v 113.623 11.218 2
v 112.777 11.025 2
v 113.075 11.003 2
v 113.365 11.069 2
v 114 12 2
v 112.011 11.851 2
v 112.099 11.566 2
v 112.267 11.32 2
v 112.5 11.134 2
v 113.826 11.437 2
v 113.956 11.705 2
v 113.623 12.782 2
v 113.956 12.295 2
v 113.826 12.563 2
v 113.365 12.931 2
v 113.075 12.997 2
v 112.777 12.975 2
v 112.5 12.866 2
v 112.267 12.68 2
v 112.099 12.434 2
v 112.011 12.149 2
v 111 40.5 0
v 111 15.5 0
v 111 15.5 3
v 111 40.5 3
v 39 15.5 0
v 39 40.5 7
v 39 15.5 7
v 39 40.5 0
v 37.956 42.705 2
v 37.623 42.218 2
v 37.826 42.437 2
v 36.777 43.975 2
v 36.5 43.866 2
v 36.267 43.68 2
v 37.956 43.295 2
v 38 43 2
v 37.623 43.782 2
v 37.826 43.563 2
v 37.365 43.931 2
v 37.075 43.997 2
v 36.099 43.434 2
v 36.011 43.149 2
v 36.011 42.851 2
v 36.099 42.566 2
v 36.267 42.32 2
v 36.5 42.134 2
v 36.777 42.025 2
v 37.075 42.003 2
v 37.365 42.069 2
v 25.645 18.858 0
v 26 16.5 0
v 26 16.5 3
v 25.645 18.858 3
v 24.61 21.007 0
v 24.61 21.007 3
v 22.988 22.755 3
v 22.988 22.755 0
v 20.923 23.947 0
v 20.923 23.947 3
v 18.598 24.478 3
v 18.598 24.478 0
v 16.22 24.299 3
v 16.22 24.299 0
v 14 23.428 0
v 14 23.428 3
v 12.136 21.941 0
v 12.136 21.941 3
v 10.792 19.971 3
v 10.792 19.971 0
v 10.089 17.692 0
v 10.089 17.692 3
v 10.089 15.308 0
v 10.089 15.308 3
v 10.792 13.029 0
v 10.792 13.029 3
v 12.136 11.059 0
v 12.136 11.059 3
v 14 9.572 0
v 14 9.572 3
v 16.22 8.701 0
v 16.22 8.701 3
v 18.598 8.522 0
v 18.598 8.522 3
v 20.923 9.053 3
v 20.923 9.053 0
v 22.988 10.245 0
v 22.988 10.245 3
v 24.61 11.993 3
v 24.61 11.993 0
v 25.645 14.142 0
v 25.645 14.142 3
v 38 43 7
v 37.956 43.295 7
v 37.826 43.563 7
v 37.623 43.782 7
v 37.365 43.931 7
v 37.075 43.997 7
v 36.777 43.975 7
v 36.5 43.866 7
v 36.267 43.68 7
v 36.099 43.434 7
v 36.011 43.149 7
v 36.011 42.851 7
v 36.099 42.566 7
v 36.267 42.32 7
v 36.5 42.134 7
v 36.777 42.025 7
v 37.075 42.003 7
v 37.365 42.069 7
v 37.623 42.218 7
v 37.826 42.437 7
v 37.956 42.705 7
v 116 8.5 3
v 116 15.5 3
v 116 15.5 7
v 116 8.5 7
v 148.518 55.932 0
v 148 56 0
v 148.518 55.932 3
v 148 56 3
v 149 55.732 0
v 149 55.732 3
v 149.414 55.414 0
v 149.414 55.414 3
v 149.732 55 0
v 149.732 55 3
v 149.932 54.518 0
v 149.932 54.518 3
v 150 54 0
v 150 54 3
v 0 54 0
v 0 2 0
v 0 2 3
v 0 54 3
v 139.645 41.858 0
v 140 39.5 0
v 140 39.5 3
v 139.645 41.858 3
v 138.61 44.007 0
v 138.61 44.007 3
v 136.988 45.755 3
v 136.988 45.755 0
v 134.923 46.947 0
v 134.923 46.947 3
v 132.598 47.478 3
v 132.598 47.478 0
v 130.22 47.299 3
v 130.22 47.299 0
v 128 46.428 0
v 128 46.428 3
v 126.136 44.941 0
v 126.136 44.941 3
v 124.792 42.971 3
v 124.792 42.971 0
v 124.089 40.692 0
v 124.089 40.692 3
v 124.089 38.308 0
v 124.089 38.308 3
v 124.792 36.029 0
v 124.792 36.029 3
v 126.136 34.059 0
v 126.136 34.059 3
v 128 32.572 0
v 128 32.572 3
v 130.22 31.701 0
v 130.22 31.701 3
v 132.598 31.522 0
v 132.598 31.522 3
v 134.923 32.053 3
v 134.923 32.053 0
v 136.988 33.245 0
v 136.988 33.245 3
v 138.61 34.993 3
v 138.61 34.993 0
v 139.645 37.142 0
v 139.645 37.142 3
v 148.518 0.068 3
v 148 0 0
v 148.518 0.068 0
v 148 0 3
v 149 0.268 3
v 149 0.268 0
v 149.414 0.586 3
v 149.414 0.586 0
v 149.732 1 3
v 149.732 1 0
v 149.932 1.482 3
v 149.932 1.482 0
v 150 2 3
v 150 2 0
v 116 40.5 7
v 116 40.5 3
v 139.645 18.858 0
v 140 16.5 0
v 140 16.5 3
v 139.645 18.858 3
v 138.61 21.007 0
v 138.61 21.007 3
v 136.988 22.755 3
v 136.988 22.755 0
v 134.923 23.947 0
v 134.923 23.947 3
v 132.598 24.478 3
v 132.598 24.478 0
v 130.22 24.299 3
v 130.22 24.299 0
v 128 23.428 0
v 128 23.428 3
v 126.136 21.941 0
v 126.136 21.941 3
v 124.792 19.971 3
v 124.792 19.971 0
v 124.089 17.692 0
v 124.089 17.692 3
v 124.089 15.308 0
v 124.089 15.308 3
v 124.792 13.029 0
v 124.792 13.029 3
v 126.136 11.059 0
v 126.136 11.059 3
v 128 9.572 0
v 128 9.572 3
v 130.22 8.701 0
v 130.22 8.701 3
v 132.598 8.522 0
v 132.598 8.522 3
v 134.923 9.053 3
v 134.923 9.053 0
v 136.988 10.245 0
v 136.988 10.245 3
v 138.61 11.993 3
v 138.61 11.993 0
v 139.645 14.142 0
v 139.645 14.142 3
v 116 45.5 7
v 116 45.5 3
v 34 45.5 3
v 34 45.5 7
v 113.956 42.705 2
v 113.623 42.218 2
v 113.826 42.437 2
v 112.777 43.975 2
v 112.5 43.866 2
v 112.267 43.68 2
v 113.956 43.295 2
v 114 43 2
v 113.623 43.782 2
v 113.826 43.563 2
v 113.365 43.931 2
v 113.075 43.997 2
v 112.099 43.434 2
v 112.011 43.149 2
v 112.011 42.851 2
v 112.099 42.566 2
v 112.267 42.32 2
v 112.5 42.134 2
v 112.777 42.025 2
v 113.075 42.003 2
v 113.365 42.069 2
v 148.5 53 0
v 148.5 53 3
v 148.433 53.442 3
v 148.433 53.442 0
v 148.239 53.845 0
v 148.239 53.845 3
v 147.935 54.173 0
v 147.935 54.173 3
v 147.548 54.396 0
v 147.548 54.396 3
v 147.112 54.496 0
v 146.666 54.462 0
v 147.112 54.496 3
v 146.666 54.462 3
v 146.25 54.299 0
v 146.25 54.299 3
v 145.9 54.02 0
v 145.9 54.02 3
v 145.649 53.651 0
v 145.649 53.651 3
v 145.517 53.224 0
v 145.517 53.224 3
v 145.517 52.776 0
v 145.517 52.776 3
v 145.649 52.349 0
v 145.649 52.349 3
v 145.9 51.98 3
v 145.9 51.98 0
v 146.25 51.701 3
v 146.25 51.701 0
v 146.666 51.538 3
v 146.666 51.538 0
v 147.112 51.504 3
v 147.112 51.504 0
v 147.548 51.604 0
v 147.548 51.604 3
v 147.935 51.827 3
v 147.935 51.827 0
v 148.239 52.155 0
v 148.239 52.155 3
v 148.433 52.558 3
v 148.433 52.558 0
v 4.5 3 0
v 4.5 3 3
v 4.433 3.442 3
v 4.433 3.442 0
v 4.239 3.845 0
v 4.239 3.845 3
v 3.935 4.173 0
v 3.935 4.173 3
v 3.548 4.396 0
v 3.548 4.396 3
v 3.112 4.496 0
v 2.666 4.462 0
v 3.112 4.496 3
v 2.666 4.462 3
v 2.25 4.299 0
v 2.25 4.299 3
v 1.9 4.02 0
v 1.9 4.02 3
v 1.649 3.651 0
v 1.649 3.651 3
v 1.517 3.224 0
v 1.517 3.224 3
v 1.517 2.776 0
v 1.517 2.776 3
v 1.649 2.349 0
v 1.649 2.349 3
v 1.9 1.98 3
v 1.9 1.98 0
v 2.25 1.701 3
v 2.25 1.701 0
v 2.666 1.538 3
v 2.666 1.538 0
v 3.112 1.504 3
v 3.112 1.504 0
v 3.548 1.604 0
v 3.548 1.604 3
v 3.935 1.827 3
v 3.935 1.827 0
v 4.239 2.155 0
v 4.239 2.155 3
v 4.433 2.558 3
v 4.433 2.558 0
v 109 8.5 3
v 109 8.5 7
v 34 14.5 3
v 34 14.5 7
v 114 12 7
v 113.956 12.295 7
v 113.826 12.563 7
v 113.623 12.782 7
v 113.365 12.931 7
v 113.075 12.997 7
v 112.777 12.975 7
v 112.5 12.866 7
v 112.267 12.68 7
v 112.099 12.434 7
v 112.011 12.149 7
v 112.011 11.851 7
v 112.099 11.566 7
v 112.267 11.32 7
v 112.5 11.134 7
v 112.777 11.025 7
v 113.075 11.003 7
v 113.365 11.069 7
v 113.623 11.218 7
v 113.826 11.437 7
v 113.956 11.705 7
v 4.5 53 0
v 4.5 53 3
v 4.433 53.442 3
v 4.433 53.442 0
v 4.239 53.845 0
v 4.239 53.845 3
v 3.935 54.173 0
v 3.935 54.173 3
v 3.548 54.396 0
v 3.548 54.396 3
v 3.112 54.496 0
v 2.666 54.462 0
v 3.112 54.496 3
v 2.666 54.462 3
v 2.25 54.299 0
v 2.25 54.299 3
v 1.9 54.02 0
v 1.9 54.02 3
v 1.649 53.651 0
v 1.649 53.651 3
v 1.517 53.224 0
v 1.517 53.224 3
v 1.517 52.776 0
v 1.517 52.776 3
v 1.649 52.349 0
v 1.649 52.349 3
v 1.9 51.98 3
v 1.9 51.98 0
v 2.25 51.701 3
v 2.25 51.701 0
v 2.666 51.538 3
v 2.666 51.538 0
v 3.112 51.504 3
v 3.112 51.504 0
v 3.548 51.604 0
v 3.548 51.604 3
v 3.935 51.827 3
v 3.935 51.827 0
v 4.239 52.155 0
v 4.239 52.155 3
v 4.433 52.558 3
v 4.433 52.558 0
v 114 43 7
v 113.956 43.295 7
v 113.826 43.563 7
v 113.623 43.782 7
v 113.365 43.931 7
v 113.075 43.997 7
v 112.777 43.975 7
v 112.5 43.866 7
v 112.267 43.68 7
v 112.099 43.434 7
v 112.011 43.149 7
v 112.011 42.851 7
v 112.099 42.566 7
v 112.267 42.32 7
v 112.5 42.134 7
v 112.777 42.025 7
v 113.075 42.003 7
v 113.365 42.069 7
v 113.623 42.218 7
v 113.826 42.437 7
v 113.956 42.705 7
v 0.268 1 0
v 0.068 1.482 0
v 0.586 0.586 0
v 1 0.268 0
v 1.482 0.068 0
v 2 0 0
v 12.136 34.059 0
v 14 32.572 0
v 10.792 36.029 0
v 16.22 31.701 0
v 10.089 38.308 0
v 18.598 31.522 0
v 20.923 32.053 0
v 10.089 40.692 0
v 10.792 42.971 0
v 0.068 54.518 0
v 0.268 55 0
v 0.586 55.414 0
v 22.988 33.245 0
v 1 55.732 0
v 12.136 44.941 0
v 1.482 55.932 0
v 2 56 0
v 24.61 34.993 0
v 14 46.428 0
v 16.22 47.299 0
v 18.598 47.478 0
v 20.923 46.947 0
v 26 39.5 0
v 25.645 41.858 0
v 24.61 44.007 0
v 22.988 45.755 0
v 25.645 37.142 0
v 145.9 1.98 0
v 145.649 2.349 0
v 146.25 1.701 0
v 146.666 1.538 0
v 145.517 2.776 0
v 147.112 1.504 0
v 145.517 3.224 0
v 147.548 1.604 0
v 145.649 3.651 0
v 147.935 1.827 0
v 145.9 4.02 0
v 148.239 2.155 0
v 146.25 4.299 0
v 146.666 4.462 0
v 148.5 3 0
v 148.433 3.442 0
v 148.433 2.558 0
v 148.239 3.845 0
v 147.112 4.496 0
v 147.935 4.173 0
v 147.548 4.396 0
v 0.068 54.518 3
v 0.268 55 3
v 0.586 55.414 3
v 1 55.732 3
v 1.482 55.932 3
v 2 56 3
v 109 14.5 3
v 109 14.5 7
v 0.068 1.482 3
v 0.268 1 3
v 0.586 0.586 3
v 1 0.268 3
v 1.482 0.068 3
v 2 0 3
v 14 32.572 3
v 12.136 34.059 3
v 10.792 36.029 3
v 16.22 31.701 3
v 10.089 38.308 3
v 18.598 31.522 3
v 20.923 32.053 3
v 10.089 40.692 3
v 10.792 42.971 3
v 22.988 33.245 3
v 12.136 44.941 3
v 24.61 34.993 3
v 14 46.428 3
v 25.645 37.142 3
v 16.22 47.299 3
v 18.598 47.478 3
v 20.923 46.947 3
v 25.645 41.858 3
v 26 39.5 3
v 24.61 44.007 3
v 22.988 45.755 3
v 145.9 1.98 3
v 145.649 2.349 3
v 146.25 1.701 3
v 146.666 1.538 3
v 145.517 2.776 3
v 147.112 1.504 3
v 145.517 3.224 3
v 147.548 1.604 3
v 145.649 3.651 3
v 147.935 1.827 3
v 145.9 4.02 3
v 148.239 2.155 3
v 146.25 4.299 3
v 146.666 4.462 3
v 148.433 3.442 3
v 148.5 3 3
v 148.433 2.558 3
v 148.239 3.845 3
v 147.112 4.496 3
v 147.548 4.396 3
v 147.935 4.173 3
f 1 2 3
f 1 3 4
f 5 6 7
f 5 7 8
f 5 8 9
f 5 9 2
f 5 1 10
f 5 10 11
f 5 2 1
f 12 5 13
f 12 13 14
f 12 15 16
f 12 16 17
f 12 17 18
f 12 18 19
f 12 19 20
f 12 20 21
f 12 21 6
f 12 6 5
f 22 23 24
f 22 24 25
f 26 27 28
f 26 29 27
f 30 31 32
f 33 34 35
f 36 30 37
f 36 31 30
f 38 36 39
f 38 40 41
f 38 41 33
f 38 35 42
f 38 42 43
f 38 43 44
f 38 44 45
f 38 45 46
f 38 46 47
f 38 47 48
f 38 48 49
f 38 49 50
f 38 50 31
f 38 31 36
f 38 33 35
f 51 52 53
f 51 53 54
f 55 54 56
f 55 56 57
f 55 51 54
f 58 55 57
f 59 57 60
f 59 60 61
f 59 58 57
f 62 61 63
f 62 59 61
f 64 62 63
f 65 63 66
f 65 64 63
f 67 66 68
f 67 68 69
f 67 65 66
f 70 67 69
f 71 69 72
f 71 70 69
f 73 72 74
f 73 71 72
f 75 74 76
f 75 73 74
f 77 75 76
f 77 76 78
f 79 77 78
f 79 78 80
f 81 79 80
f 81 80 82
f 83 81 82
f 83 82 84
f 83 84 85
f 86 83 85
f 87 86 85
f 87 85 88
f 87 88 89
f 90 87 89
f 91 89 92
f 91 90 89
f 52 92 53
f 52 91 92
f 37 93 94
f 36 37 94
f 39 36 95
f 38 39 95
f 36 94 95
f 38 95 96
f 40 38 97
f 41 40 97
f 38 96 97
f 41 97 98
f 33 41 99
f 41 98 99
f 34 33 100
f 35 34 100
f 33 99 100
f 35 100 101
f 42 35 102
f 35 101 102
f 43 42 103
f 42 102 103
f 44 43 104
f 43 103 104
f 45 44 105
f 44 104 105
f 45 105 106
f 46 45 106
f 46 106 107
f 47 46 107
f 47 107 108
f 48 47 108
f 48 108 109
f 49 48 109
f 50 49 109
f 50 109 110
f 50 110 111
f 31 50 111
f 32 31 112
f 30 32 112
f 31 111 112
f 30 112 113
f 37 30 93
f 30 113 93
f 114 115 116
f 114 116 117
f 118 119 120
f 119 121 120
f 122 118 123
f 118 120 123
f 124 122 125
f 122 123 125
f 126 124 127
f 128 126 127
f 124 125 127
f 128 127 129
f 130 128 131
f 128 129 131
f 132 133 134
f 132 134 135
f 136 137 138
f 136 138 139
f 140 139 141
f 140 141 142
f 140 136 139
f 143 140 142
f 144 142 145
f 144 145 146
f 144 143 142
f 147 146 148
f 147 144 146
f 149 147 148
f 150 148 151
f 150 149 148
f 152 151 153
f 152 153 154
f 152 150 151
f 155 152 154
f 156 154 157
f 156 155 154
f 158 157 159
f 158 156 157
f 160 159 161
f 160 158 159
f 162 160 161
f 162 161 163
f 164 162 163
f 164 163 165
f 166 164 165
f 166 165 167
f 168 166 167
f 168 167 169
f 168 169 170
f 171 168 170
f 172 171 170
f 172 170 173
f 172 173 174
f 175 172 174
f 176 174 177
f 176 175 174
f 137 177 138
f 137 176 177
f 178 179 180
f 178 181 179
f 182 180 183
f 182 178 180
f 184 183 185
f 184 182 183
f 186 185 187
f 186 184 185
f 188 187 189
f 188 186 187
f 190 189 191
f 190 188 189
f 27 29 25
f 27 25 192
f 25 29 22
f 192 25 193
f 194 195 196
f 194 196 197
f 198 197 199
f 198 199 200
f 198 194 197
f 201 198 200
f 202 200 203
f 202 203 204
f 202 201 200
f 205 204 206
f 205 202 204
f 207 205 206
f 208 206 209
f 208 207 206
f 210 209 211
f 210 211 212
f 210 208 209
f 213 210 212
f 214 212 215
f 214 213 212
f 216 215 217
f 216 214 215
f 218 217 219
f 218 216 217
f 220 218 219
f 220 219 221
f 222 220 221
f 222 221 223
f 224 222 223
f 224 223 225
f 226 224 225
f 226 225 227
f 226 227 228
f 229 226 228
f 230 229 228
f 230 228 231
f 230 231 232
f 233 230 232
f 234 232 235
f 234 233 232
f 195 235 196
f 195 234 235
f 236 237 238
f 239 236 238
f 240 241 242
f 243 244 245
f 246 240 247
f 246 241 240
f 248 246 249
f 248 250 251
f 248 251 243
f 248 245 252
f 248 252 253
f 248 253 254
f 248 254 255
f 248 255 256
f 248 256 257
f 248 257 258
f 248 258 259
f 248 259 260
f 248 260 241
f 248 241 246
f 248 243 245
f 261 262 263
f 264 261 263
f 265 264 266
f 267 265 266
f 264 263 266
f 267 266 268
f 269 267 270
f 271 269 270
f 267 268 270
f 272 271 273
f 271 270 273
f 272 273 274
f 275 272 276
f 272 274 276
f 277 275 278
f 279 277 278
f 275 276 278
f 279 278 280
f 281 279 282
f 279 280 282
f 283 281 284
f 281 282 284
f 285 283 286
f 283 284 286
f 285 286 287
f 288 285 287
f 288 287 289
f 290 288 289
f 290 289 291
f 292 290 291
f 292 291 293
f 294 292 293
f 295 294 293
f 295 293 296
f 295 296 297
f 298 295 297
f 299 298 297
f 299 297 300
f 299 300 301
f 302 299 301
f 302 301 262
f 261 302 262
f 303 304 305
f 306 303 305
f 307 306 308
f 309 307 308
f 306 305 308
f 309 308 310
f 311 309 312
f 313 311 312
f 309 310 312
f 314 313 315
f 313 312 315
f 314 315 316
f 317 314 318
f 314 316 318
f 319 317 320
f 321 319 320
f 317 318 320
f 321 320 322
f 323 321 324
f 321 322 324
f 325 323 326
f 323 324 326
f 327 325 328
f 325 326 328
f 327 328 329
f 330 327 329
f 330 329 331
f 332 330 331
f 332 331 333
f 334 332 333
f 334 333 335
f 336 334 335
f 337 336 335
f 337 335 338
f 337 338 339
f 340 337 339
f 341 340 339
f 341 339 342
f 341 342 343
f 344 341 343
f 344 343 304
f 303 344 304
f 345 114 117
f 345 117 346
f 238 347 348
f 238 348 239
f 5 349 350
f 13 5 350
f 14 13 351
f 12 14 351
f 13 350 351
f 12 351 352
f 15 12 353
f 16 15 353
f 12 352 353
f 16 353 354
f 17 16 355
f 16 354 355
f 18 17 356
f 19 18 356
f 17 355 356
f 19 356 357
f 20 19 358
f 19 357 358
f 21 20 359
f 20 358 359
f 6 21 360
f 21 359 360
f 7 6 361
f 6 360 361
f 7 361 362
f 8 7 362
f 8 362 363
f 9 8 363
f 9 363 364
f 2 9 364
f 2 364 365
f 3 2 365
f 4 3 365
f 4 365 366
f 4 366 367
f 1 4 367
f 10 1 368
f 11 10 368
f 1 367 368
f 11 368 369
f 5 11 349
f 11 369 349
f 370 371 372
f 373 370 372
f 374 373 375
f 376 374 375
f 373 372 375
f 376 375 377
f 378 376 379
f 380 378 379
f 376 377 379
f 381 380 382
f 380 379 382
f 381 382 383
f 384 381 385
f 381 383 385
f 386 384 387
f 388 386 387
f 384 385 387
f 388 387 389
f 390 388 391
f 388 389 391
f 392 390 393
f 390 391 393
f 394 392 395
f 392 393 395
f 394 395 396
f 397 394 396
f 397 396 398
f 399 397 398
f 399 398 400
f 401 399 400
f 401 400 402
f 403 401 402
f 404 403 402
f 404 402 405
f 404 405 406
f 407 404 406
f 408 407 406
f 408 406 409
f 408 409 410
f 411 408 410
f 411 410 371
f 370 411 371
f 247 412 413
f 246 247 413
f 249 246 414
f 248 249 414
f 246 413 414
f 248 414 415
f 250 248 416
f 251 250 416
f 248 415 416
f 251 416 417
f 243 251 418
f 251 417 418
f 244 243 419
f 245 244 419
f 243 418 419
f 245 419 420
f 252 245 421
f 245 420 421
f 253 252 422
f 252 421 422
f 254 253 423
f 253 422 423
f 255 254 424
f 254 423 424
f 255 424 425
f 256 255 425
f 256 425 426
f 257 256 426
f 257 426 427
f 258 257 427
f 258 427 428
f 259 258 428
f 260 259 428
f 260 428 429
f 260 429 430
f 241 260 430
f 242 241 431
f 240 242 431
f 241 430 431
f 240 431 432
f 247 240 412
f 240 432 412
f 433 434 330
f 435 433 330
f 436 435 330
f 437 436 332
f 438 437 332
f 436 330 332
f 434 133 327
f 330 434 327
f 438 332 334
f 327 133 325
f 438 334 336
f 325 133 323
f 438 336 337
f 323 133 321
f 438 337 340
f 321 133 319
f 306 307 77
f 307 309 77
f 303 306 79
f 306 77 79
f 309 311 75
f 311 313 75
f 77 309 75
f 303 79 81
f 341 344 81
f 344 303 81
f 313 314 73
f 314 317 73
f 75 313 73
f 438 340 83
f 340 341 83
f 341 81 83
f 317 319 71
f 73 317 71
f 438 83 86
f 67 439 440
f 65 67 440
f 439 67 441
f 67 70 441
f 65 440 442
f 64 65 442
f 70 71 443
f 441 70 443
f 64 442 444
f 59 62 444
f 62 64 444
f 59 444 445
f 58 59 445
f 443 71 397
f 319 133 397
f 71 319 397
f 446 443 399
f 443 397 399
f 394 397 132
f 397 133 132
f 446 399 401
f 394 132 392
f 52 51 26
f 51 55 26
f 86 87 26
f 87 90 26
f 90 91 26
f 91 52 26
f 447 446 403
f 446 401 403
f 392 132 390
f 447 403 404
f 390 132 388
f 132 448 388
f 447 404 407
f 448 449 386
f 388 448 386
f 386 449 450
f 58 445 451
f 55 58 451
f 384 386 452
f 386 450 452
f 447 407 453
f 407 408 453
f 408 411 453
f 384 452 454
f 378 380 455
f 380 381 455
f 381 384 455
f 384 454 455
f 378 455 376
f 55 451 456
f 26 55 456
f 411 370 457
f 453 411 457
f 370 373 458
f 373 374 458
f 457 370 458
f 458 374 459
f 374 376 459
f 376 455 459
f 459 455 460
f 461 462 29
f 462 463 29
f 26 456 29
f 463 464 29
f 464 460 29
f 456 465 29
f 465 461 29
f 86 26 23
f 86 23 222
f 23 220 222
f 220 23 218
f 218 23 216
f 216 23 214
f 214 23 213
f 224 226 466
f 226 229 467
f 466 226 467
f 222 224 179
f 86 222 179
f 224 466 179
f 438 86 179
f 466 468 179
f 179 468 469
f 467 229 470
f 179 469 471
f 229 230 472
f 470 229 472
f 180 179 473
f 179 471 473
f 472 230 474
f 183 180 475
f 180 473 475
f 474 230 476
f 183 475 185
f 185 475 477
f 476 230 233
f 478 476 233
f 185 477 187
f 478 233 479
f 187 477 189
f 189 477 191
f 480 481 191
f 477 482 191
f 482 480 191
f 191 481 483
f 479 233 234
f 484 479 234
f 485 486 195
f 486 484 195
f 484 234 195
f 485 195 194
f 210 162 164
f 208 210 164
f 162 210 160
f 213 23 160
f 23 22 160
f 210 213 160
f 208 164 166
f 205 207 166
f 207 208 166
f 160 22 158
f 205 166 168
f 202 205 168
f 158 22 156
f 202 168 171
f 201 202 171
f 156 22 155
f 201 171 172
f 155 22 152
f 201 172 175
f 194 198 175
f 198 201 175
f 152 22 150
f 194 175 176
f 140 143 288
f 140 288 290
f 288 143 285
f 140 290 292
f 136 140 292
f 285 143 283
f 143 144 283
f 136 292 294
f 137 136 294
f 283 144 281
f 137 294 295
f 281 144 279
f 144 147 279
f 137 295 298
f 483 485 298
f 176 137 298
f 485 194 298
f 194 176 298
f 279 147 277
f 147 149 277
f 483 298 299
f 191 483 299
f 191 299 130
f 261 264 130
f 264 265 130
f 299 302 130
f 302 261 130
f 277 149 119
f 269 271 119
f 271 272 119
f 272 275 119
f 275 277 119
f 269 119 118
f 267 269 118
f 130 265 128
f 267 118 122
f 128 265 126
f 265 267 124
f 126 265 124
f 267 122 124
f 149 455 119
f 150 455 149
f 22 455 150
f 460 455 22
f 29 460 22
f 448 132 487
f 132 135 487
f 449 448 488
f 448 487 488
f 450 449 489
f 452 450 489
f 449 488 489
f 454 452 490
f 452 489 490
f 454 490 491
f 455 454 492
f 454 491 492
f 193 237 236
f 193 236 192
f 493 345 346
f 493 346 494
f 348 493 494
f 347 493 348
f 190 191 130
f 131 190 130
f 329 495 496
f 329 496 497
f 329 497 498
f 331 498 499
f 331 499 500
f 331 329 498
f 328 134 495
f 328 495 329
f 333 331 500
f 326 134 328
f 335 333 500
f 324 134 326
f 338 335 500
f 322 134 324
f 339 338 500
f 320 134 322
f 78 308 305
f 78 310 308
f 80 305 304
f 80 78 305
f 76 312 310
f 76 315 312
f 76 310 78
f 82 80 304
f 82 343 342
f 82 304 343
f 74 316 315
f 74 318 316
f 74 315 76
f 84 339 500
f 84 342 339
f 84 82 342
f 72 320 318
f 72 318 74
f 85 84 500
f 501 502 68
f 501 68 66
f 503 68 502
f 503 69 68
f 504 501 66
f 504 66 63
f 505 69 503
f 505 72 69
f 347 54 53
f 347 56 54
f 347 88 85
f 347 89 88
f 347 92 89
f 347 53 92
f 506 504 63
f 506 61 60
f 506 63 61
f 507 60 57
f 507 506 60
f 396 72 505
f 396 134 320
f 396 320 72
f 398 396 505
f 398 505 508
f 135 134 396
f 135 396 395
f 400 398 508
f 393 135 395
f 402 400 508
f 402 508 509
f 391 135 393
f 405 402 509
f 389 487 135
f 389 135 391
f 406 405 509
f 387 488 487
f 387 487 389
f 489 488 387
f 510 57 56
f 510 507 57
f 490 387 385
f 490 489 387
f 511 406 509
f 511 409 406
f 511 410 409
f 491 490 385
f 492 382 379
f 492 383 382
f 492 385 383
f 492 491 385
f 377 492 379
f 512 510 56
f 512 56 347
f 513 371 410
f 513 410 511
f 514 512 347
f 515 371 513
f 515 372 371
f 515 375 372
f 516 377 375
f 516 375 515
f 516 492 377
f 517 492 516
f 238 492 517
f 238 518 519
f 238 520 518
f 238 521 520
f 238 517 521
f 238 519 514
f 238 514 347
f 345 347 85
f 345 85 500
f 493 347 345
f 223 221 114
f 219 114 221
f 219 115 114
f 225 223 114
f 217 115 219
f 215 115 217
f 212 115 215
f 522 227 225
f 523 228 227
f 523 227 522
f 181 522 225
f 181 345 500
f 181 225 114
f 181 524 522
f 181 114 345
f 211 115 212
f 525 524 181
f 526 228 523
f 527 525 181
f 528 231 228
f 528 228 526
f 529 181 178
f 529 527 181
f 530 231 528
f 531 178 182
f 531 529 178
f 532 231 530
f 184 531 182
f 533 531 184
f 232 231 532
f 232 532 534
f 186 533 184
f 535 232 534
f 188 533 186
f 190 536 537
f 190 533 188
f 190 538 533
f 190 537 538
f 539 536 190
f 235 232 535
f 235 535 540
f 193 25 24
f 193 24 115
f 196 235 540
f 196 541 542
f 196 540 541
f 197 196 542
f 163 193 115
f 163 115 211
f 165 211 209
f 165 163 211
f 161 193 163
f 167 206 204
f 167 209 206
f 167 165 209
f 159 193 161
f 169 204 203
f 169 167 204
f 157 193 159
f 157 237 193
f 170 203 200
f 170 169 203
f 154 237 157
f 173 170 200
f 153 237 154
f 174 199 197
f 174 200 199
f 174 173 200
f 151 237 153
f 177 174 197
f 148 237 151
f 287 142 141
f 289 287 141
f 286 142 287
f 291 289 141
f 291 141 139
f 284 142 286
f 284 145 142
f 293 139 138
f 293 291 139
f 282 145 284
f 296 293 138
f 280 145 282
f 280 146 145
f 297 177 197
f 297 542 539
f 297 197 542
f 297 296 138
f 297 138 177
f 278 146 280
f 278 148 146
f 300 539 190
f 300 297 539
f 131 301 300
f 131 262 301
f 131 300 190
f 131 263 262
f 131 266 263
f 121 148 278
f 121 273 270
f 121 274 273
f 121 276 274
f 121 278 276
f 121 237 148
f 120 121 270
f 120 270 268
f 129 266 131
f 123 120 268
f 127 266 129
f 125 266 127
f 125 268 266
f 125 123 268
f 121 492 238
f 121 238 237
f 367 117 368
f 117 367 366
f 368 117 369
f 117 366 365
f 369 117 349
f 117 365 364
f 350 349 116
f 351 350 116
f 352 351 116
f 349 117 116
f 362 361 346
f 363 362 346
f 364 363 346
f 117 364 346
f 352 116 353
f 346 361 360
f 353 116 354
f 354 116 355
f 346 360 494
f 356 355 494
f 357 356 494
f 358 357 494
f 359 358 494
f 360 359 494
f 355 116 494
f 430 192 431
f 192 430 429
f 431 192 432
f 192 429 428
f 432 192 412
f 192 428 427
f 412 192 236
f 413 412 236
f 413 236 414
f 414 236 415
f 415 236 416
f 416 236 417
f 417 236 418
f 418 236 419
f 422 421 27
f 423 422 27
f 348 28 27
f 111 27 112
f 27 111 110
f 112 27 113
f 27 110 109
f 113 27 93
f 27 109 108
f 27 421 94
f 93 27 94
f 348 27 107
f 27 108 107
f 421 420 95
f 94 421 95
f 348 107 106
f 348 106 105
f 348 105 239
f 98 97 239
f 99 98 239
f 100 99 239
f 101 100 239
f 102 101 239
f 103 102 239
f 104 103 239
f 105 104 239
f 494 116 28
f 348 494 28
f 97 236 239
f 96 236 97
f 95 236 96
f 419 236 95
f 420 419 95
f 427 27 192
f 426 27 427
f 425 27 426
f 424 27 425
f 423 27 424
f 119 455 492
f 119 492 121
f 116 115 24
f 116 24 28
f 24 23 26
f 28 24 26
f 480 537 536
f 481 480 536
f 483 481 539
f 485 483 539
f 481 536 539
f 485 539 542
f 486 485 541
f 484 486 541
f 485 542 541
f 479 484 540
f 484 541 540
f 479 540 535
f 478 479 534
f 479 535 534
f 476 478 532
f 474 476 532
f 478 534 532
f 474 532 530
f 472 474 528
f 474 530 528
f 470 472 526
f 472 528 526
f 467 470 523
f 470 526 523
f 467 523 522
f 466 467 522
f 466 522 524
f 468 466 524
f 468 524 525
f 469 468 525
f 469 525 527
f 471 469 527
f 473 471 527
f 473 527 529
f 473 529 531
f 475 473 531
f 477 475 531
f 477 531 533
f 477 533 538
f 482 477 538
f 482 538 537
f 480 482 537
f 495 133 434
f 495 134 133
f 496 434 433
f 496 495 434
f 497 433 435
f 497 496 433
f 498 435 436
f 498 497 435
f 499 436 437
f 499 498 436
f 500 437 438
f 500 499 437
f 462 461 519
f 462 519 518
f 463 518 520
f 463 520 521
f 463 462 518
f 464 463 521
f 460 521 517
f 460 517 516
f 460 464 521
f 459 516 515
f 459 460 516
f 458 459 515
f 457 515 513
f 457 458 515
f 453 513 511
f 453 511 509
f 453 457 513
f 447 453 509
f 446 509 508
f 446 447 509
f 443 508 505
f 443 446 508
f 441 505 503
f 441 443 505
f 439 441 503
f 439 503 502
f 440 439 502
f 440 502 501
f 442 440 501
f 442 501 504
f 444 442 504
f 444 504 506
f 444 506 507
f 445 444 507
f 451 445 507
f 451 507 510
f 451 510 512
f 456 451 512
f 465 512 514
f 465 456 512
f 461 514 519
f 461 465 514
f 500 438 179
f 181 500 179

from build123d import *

# Parameters (mm, degrees)
SKETCH_W        = 150
SKETCH_H        = 56
SKETCH_R        = 8
SKETCH_W_2      = 72
SKETCH_H_2      = 25
PAD_DEPTH       = 3
PAD001_DEPTH    = 4
SKETCH002_R     = 1.5
POCKET_DEPTH    = 5
SKETCH003_R     = 1
POCKET001_DEPTH = 5
FILLET_R        = 2


with BuildPart() as part:
    # Sketch → Pad (new body)
    with BuildSketch(Plane.XY):
        with Locations((75, 28)):
            Rectangle(SKETCH_W, SKETCH_H)
        with Locations((18, 16.5)):
            Circle(SKETCH_R, mode=Mode.SUBTRACT)
        with Locations((18, 39.5)):
            Circle(SKETCH_R, mode=Mode.SUBTRACT)
        with Locations((132, 16.5)):
            Circle(SKETCH_R, mode=Mode.SUBTRACT)
        with Locations((132, 39.5)):
            Circle(SKETCH_R, mode=Mode.SUBTRACT)
        with Locations((75, 28)):
            Rectangle(SKETCH_W_2, SKETCH_H_2, mode=Mode.SUBTRACT)
    extrude(amount=PAD_DEPTH)

    # Sketch001 (on Face14 of Pad) → Pad001 (join)
    with BuildSketch(Plane.XY.offset(3)):
        Polygon((39, 15.5), (111, 15.5), (116, 15.5), (116, 8.5), (109, 8.5), (109, 14.5), (34, 14.5), (34, 45.5), (111, 45.5), (116, 45.5), (116, 40.5), (111, 40.5), (39, 40.5), align=None)
    extrude(amount=PAD001_DEPTH)

    # Sketch002 (on Face5 of Pad001) → Pocket (cut)
    with BuildSketch(Plane.XY.offset(3)):
        with Locations((3, 53)):
            Circle(SKETCH002_R)
        with Locations((147, 53)):
            Circle(SKETCH002_R)
        with Locations((3, 3)):
            Circle(SKETCH002_R)
        with Locations((147, 3)):
            Circle(SKETCH002_R)
    extrude(amount=-POCKET_DEPTH, mode=Mode.SUBTRACT)

    # Sketch003 (on Face32 of Pocket) → Pocket001 (cut)
    with BuildSketch(Plane.XY.offset(7)):
        with Locations((37, 43)):
            Circle(SKETCH003_R)
        with Locations((113, 43)):
            Circle(SKETCH003_R)
        with Locations((113, 12)):
            Circle(SKETCH003_R)
    extrude(amount=-POCKET001_DEPTH, mode=Mode.SUBTRACT)

    # Fillet
    fillet_edges = [part.edges().sort_by_distance(p)[0] for p in [
        (0, 0, 1.5),
        (0, 56, 1.5),
        (150, 0, 1.5),
        (150, 56, 1.5),
    ]]
    fillet(fillet_edges, radius=FILLET_R)


solid = part.part
